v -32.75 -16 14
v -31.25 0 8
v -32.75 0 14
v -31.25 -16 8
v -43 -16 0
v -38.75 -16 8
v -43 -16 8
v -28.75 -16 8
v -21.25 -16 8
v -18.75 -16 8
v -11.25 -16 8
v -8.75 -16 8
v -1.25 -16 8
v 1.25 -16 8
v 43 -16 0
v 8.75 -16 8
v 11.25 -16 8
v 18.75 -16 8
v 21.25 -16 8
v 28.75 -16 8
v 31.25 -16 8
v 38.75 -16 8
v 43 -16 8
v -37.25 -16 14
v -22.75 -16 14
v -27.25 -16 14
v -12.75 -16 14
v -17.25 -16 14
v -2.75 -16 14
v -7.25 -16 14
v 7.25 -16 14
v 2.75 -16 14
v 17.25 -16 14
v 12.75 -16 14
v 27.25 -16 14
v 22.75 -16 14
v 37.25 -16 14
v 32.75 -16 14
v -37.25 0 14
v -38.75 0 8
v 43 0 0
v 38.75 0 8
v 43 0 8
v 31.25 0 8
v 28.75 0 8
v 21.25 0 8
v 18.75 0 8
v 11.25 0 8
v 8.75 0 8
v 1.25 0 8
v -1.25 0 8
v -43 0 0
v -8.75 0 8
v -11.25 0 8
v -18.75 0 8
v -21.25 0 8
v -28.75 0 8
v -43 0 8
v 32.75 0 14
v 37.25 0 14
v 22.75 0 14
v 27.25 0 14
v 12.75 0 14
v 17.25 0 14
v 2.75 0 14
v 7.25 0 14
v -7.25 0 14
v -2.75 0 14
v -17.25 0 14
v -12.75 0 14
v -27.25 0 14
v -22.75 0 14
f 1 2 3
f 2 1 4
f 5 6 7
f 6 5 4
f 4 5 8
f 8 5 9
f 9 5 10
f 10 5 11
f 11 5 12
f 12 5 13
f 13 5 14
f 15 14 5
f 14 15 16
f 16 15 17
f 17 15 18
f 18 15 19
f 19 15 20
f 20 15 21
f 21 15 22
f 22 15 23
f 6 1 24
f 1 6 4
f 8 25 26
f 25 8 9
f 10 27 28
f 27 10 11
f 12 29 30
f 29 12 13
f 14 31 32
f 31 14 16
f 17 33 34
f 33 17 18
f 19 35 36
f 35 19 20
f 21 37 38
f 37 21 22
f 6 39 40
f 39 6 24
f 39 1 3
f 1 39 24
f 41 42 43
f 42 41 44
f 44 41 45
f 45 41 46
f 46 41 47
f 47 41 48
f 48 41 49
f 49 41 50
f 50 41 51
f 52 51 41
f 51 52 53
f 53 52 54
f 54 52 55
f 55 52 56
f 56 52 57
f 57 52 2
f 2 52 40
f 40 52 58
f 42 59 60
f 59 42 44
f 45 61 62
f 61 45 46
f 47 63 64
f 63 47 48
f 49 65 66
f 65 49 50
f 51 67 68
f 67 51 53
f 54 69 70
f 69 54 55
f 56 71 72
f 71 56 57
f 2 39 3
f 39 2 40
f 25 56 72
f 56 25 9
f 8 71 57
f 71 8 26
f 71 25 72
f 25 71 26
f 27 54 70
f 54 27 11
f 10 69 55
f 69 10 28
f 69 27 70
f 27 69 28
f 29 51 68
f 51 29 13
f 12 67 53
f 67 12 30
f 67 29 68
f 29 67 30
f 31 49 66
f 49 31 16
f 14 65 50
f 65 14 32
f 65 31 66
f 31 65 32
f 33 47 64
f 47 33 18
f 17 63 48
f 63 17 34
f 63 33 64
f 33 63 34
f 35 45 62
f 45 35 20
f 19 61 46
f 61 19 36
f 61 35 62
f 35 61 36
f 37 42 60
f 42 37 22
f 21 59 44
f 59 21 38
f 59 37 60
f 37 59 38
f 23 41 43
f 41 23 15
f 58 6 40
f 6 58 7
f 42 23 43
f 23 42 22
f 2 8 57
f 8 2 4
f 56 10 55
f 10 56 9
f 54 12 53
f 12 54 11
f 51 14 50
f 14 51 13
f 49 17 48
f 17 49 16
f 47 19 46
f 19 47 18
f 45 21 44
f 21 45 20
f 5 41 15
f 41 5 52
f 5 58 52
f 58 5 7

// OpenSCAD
$fn = 32;

// ----------------------------------------------------------------------
// Toothed rack, 8 teeth
// 10 mm pitch, 6 mm teeth
// ----------------------------------------------------------------------

// --- parameters (mm) ---
bar_w = 16;     // bar width (Y)
bar_h = 8;      // bar height (Z)
teeth = 8;      // number of teeth
pitch = 10;     // tooth pitch
tooth_h = 6;    // tooth height above the bar
root_w = 8;     // tooth width at the root
crest_w = 4.5;  // tooth width at the crest

// --- derived feature positions (mm) ---
span = (teeth - 1) * pitch;  // = 70   distance between the outer teeth
bar_l = span + root_w + 8;   // = 86   bar length: teeth plus 4 mm at each end
tooth_x = -span / 2;         // = -35   X of the first tooth
height = bar_h + tooth_h;    // = 14   overall height
feature_centers = [
  [tooth_x + 0 * pitch, -bar_w / 2],
  [tooth_x + 1 * pitch, -bar_w / 2],
  [tooth_x + 2 * pitch, -bar_w / 2],
  [tooth_x + 3 * pitch, -bar_w / 2],
  [tooth_x + 4 * pitch, -bar_w / 2],
  [tooth_x + 5 * pitch, -bar_w / 2],
  [tooth_x + 6 * pitch, -bar_w / 2],
  [tooth_x + 7 * pitch, -bar_w / 2]
];   // tooth centre line, drives the tooth loop

// bar with a rack of teeth, one extruded trapezoium per centre
module rack_tooth() {
  linear_extrude(height = bar_w)
    polygon(points = [
      [0, 0],
      [root_w, 0],
      [root_w / 2 + crest_w / 2, tooth_h + 1],
      [root_w / 2 - crest_w / 2, tooth_h + 1]
    ]);
}

union() {
  translate([-bar_l / 2, -bar_w, 0]) cube([bar_l, bar_w, bar_h]);
  for (centre = feature_centers)
    translate([centre[0] - root_w / 2, 0, bar_h - 1]) rotate([90, 0, 0]) rack_tooth();
}
